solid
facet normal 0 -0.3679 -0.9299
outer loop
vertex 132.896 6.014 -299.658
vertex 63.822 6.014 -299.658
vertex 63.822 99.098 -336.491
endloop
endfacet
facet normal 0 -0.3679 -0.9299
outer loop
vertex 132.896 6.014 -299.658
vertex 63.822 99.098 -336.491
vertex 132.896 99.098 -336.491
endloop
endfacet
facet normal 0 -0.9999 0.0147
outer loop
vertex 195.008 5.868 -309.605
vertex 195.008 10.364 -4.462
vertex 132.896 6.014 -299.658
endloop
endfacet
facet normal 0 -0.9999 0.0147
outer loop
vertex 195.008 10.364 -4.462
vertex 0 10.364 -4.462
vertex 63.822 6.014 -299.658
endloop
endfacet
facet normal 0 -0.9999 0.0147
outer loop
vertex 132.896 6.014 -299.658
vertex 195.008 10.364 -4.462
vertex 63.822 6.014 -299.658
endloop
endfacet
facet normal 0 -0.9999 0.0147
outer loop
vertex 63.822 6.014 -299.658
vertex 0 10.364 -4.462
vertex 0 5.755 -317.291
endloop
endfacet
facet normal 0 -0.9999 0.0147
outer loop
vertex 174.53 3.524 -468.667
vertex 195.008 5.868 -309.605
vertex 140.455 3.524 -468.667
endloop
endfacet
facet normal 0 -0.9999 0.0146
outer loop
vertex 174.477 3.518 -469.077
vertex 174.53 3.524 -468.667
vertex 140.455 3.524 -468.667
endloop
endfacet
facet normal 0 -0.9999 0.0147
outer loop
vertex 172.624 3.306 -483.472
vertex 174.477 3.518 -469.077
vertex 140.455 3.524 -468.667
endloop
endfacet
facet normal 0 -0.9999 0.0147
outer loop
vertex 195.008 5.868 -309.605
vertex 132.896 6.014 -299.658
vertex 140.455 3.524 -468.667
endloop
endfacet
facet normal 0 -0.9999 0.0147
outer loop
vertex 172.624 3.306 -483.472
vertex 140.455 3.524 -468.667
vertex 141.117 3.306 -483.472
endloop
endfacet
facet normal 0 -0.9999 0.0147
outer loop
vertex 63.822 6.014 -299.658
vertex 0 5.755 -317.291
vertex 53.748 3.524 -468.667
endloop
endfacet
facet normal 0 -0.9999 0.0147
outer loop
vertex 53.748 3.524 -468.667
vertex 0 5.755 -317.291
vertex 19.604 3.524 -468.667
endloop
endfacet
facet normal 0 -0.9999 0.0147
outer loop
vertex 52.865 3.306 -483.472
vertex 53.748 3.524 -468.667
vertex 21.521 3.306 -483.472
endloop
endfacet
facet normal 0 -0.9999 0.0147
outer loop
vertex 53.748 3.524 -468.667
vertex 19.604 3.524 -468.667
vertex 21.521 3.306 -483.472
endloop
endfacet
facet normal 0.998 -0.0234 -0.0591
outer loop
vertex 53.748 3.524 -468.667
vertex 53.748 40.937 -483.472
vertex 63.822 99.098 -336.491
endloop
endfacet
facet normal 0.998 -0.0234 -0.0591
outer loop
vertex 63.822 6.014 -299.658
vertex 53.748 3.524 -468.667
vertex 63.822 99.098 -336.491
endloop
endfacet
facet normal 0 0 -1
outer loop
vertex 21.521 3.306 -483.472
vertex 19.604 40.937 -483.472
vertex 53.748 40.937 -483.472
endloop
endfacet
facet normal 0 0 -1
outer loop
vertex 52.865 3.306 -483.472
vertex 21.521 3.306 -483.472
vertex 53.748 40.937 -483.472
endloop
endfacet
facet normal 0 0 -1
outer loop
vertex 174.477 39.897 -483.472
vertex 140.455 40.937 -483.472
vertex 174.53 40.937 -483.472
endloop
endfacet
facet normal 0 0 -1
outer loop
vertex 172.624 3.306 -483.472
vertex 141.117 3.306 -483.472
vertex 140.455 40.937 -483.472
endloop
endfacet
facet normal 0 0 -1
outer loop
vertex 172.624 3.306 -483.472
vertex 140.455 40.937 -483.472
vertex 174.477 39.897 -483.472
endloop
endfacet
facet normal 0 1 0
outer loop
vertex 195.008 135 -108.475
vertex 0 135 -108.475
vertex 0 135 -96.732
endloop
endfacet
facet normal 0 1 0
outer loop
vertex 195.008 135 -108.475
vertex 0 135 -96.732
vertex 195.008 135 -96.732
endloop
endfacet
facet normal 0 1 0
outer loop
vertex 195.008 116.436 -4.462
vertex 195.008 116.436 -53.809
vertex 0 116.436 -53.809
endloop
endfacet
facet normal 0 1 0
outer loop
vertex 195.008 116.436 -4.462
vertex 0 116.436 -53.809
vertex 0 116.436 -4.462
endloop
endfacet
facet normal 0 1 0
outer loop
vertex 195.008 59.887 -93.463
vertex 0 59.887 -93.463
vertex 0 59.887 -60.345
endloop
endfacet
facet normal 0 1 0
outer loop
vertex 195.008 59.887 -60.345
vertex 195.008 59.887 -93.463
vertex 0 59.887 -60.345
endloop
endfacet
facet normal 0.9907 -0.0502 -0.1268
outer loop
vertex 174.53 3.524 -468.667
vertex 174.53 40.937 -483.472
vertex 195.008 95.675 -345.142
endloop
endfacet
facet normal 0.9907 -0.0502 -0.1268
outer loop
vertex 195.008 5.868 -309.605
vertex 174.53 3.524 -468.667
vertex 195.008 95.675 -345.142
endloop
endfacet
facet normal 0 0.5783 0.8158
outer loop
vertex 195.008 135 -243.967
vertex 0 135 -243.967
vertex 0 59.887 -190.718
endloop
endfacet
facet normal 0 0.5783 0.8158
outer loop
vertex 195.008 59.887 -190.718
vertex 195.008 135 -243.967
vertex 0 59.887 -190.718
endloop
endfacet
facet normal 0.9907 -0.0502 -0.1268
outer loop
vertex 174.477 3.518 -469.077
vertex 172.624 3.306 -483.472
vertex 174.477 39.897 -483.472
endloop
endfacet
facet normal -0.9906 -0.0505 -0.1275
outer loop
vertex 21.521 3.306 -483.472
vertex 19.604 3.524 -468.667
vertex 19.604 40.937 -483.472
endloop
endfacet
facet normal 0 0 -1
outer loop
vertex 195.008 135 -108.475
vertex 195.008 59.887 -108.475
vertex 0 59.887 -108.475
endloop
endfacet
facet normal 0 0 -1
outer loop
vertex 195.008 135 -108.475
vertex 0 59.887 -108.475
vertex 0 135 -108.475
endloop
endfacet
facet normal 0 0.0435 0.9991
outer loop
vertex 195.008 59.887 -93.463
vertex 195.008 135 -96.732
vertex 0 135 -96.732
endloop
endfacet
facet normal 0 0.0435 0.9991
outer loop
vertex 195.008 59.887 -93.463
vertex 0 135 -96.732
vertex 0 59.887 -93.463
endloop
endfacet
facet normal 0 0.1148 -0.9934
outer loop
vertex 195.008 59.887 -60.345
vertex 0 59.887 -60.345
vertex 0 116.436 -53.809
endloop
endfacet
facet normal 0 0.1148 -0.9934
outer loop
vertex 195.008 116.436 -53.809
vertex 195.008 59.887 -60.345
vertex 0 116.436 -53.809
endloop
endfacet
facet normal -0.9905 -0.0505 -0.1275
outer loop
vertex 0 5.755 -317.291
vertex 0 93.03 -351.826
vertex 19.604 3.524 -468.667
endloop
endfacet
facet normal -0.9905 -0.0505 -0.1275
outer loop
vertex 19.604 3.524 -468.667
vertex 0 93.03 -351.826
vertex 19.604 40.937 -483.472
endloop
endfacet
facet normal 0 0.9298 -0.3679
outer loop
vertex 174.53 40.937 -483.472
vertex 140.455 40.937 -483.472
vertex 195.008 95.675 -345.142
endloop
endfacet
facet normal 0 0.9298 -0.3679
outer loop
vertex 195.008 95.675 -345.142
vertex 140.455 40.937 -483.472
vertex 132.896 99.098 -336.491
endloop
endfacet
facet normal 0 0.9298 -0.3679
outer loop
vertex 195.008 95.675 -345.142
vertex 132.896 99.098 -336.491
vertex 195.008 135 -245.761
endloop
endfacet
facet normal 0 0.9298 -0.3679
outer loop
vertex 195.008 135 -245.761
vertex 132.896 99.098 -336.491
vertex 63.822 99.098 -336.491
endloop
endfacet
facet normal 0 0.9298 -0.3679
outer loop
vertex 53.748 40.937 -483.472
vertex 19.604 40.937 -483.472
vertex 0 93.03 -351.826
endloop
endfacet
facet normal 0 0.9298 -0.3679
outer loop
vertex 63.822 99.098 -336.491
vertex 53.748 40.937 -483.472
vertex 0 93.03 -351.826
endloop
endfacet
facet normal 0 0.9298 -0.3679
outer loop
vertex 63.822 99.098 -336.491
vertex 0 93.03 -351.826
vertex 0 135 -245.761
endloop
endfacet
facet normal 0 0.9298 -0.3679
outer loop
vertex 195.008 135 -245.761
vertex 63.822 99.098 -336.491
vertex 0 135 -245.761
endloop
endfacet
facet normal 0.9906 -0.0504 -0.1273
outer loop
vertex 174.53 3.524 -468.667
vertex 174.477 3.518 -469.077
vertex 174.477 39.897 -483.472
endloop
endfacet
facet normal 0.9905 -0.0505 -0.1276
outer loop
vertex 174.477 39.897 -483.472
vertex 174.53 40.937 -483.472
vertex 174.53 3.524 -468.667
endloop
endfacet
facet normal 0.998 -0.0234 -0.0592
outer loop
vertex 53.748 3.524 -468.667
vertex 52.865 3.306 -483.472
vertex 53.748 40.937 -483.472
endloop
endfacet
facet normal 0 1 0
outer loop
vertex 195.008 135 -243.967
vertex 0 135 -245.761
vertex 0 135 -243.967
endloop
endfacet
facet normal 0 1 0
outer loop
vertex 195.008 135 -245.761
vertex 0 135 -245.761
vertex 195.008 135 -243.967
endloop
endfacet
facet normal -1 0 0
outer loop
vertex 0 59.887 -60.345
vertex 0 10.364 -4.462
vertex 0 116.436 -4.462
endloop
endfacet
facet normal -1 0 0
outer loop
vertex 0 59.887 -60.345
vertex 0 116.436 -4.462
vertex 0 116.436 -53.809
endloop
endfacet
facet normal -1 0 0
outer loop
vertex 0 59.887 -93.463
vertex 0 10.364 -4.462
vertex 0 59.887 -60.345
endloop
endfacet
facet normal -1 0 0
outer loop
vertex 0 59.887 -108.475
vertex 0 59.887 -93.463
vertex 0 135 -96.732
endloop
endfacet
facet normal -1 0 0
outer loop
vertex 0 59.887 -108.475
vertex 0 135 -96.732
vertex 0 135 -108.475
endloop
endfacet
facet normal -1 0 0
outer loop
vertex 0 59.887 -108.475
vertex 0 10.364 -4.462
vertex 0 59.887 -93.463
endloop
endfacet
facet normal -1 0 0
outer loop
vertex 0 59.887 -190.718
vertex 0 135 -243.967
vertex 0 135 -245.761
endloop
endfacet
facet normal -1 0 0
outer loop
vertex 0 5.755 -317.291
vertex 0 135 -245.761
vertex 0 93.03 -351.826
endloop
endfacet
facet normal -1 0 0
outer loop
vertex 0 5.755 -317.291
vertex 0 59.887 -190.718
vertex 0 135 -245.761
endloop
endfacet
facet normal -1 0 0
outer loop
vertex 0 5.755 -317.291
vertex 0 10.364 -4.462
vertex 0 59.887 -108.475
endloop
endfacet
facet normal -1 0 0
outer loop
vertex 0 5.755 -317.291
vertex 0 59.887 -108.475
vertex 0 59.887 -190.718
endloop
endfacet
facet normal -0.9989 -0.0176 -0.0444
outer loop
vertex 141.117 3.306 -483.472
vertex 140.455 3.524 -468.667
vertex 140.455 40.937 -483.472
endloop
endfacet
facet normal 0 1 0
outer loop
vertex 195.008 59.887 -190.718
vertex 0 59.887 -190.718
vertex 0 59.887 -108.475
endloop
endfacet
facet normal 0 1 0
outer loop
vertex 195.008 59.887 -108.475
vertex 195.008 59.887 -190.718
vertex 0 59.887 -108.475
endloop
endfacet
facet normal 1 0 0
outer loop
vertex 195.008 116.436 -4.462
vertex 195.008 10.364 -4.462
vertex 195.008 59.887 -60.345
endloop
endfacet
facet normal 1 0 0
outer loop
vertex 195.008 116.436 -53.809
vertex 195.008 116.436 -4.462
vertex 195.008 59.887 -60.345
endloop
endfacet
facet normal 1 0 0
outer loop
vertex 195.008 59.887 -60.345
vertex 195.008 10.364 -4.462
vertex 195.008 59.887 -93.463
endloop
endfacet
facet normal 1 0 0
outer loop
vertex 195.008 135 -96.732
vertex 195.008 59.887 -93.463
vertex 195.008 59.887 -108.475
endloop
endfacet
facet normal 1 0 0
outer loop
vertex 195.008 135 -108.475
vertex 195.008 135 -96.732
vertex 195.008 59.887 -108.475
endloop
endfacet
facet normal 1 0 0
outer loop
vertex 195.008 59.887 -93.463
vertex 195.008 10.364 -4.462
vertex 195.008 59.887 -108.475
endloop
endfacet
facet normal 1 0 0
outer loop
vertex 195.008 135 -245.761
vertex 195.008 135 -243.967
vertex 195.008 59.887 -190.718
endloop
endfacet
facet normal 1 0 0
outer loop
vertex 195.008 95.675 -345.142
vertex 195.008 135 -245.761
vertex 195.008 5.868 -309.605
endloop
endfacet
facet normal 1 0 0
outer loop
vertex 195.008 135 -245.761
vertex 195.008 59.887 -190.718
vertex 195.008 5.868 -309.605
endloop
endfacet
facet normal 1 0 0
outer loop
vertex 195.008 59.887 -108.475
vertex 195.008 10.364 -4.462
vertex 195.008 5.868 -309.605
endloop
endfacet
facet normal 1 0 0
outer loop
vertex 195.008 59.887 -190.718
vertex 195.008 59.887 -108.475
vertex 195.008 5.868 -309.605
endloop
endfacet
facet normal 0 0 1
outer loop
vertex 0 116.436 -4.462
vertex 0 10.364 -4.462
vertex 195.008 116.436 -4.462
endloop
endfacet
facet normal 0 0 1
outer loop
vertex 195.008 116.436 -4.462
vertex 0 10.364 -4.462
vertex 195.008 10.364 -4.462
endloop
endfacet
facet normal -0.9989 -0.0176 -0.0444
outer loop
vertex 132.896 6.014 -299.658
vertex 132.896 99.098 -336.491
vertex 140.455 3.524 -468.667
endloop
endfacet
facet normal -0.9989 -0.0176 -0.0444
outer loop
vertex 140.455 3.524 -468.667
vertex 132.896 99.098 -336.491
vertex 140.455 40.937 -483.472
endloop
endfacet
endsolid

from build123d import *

# Parameters (mm, degrees)
SKETCH_1_W           = 195.008255005
SKETCH_1_H           = 479.009395123
EXTRUDE_2_DEPTH      = 135
CUT_EXTRUDE_4_DEPTH  = 200
CUT_EXTRUDE_23_DEPTH = 200


with BuildPart() as part:
    # Эскиз1 → Бобышка-Вытянуть2 (new body)
    with BuildSketch(Plane(origin=(0, 0, 0), x_dir=(1, 0, 0), z_dir=(0, 1, 0))):
        with Locations((97.504127503, 243.967165232)):
            Rectangle(SKETCH_1_W, SKETCH_1_H)
    extrude(amount=EXTRUDE_2_DEPTH)

    # Эскиз3 → Вырез-Вытянуть4 (cut)
    with BuildSketch(Plane.ZY):
        Polygon((-483.471862793, 40.937199902), (-245.760530455, 135), (-483.471862793, 135), align=None)
        Polygon((-108.474701812, 135), (-243.967165232, 135), (-190.717834923, 59.88686474), (-108.474701812, 59.88686474), align=None)
        Polygon((-4.46246767, 135), (-96.73151757, 135), (-93.463282811, 59.88686474), (-60.345170592, 59.88686474), (-53.808701075, 116.435636272), (-4.46246767, 116.435636272), align=None)
        Polygon((-4.46246767, 10.364015235), (-483.471862793, 3.305962882), (-483.471862793, 0), (-4.46246767, 0), align=None)
    extrude(amount=-CUT_EXTRUDE_4_DEPTH, mode=Mode.SUBTRACT)

    # Эскиз4 → Вырез-Вытянуть23 (cut)
    with BuildSketch(Plane(origin=(0, 200.805738218, -79.459190383), x_dir=(1, 0, 0), z_dir=(0, 0.9298484645549542, -0.3679427033721343))):
        Polygon((53.747628165, 434.493025273), (140.455159465, 434.493025273), (143.17020938, 491.267849843), (50.129149916, 491.267849843), align=None)
        Polygon((132.896060194, 276.42354275), (140.455159465, 434.493025273), (53.747628165, 434.493025273), (63.82200512, 276.42354275), align=None)
        Polygon((0, 434.493025273), (19.603729829, 434.493025273), (27.465109106, 491.267849843), (0, 491.267849843), align=None)
        Polygon((0, 434.493025273), (0, 292.915029518), (19.603729829, 434.493025273), align=None)
        Polygon((174.530095187, 434.493025273), (195.008255005, 285.726840395), (195.008255005, 434.493025273), align=None)
        Polygon((174.477407826, 434.875779277), (174.530095187, 434.493025273), (195.008255005, 434.493025273), (195.008255005, 491.267849843), (166.714851877, 491.267849843), align=None)
    extrude(amount=-CUT_EXTRUDE_23_DEPTH, mode=Mode.SUBTRACT)


solid = part.part
